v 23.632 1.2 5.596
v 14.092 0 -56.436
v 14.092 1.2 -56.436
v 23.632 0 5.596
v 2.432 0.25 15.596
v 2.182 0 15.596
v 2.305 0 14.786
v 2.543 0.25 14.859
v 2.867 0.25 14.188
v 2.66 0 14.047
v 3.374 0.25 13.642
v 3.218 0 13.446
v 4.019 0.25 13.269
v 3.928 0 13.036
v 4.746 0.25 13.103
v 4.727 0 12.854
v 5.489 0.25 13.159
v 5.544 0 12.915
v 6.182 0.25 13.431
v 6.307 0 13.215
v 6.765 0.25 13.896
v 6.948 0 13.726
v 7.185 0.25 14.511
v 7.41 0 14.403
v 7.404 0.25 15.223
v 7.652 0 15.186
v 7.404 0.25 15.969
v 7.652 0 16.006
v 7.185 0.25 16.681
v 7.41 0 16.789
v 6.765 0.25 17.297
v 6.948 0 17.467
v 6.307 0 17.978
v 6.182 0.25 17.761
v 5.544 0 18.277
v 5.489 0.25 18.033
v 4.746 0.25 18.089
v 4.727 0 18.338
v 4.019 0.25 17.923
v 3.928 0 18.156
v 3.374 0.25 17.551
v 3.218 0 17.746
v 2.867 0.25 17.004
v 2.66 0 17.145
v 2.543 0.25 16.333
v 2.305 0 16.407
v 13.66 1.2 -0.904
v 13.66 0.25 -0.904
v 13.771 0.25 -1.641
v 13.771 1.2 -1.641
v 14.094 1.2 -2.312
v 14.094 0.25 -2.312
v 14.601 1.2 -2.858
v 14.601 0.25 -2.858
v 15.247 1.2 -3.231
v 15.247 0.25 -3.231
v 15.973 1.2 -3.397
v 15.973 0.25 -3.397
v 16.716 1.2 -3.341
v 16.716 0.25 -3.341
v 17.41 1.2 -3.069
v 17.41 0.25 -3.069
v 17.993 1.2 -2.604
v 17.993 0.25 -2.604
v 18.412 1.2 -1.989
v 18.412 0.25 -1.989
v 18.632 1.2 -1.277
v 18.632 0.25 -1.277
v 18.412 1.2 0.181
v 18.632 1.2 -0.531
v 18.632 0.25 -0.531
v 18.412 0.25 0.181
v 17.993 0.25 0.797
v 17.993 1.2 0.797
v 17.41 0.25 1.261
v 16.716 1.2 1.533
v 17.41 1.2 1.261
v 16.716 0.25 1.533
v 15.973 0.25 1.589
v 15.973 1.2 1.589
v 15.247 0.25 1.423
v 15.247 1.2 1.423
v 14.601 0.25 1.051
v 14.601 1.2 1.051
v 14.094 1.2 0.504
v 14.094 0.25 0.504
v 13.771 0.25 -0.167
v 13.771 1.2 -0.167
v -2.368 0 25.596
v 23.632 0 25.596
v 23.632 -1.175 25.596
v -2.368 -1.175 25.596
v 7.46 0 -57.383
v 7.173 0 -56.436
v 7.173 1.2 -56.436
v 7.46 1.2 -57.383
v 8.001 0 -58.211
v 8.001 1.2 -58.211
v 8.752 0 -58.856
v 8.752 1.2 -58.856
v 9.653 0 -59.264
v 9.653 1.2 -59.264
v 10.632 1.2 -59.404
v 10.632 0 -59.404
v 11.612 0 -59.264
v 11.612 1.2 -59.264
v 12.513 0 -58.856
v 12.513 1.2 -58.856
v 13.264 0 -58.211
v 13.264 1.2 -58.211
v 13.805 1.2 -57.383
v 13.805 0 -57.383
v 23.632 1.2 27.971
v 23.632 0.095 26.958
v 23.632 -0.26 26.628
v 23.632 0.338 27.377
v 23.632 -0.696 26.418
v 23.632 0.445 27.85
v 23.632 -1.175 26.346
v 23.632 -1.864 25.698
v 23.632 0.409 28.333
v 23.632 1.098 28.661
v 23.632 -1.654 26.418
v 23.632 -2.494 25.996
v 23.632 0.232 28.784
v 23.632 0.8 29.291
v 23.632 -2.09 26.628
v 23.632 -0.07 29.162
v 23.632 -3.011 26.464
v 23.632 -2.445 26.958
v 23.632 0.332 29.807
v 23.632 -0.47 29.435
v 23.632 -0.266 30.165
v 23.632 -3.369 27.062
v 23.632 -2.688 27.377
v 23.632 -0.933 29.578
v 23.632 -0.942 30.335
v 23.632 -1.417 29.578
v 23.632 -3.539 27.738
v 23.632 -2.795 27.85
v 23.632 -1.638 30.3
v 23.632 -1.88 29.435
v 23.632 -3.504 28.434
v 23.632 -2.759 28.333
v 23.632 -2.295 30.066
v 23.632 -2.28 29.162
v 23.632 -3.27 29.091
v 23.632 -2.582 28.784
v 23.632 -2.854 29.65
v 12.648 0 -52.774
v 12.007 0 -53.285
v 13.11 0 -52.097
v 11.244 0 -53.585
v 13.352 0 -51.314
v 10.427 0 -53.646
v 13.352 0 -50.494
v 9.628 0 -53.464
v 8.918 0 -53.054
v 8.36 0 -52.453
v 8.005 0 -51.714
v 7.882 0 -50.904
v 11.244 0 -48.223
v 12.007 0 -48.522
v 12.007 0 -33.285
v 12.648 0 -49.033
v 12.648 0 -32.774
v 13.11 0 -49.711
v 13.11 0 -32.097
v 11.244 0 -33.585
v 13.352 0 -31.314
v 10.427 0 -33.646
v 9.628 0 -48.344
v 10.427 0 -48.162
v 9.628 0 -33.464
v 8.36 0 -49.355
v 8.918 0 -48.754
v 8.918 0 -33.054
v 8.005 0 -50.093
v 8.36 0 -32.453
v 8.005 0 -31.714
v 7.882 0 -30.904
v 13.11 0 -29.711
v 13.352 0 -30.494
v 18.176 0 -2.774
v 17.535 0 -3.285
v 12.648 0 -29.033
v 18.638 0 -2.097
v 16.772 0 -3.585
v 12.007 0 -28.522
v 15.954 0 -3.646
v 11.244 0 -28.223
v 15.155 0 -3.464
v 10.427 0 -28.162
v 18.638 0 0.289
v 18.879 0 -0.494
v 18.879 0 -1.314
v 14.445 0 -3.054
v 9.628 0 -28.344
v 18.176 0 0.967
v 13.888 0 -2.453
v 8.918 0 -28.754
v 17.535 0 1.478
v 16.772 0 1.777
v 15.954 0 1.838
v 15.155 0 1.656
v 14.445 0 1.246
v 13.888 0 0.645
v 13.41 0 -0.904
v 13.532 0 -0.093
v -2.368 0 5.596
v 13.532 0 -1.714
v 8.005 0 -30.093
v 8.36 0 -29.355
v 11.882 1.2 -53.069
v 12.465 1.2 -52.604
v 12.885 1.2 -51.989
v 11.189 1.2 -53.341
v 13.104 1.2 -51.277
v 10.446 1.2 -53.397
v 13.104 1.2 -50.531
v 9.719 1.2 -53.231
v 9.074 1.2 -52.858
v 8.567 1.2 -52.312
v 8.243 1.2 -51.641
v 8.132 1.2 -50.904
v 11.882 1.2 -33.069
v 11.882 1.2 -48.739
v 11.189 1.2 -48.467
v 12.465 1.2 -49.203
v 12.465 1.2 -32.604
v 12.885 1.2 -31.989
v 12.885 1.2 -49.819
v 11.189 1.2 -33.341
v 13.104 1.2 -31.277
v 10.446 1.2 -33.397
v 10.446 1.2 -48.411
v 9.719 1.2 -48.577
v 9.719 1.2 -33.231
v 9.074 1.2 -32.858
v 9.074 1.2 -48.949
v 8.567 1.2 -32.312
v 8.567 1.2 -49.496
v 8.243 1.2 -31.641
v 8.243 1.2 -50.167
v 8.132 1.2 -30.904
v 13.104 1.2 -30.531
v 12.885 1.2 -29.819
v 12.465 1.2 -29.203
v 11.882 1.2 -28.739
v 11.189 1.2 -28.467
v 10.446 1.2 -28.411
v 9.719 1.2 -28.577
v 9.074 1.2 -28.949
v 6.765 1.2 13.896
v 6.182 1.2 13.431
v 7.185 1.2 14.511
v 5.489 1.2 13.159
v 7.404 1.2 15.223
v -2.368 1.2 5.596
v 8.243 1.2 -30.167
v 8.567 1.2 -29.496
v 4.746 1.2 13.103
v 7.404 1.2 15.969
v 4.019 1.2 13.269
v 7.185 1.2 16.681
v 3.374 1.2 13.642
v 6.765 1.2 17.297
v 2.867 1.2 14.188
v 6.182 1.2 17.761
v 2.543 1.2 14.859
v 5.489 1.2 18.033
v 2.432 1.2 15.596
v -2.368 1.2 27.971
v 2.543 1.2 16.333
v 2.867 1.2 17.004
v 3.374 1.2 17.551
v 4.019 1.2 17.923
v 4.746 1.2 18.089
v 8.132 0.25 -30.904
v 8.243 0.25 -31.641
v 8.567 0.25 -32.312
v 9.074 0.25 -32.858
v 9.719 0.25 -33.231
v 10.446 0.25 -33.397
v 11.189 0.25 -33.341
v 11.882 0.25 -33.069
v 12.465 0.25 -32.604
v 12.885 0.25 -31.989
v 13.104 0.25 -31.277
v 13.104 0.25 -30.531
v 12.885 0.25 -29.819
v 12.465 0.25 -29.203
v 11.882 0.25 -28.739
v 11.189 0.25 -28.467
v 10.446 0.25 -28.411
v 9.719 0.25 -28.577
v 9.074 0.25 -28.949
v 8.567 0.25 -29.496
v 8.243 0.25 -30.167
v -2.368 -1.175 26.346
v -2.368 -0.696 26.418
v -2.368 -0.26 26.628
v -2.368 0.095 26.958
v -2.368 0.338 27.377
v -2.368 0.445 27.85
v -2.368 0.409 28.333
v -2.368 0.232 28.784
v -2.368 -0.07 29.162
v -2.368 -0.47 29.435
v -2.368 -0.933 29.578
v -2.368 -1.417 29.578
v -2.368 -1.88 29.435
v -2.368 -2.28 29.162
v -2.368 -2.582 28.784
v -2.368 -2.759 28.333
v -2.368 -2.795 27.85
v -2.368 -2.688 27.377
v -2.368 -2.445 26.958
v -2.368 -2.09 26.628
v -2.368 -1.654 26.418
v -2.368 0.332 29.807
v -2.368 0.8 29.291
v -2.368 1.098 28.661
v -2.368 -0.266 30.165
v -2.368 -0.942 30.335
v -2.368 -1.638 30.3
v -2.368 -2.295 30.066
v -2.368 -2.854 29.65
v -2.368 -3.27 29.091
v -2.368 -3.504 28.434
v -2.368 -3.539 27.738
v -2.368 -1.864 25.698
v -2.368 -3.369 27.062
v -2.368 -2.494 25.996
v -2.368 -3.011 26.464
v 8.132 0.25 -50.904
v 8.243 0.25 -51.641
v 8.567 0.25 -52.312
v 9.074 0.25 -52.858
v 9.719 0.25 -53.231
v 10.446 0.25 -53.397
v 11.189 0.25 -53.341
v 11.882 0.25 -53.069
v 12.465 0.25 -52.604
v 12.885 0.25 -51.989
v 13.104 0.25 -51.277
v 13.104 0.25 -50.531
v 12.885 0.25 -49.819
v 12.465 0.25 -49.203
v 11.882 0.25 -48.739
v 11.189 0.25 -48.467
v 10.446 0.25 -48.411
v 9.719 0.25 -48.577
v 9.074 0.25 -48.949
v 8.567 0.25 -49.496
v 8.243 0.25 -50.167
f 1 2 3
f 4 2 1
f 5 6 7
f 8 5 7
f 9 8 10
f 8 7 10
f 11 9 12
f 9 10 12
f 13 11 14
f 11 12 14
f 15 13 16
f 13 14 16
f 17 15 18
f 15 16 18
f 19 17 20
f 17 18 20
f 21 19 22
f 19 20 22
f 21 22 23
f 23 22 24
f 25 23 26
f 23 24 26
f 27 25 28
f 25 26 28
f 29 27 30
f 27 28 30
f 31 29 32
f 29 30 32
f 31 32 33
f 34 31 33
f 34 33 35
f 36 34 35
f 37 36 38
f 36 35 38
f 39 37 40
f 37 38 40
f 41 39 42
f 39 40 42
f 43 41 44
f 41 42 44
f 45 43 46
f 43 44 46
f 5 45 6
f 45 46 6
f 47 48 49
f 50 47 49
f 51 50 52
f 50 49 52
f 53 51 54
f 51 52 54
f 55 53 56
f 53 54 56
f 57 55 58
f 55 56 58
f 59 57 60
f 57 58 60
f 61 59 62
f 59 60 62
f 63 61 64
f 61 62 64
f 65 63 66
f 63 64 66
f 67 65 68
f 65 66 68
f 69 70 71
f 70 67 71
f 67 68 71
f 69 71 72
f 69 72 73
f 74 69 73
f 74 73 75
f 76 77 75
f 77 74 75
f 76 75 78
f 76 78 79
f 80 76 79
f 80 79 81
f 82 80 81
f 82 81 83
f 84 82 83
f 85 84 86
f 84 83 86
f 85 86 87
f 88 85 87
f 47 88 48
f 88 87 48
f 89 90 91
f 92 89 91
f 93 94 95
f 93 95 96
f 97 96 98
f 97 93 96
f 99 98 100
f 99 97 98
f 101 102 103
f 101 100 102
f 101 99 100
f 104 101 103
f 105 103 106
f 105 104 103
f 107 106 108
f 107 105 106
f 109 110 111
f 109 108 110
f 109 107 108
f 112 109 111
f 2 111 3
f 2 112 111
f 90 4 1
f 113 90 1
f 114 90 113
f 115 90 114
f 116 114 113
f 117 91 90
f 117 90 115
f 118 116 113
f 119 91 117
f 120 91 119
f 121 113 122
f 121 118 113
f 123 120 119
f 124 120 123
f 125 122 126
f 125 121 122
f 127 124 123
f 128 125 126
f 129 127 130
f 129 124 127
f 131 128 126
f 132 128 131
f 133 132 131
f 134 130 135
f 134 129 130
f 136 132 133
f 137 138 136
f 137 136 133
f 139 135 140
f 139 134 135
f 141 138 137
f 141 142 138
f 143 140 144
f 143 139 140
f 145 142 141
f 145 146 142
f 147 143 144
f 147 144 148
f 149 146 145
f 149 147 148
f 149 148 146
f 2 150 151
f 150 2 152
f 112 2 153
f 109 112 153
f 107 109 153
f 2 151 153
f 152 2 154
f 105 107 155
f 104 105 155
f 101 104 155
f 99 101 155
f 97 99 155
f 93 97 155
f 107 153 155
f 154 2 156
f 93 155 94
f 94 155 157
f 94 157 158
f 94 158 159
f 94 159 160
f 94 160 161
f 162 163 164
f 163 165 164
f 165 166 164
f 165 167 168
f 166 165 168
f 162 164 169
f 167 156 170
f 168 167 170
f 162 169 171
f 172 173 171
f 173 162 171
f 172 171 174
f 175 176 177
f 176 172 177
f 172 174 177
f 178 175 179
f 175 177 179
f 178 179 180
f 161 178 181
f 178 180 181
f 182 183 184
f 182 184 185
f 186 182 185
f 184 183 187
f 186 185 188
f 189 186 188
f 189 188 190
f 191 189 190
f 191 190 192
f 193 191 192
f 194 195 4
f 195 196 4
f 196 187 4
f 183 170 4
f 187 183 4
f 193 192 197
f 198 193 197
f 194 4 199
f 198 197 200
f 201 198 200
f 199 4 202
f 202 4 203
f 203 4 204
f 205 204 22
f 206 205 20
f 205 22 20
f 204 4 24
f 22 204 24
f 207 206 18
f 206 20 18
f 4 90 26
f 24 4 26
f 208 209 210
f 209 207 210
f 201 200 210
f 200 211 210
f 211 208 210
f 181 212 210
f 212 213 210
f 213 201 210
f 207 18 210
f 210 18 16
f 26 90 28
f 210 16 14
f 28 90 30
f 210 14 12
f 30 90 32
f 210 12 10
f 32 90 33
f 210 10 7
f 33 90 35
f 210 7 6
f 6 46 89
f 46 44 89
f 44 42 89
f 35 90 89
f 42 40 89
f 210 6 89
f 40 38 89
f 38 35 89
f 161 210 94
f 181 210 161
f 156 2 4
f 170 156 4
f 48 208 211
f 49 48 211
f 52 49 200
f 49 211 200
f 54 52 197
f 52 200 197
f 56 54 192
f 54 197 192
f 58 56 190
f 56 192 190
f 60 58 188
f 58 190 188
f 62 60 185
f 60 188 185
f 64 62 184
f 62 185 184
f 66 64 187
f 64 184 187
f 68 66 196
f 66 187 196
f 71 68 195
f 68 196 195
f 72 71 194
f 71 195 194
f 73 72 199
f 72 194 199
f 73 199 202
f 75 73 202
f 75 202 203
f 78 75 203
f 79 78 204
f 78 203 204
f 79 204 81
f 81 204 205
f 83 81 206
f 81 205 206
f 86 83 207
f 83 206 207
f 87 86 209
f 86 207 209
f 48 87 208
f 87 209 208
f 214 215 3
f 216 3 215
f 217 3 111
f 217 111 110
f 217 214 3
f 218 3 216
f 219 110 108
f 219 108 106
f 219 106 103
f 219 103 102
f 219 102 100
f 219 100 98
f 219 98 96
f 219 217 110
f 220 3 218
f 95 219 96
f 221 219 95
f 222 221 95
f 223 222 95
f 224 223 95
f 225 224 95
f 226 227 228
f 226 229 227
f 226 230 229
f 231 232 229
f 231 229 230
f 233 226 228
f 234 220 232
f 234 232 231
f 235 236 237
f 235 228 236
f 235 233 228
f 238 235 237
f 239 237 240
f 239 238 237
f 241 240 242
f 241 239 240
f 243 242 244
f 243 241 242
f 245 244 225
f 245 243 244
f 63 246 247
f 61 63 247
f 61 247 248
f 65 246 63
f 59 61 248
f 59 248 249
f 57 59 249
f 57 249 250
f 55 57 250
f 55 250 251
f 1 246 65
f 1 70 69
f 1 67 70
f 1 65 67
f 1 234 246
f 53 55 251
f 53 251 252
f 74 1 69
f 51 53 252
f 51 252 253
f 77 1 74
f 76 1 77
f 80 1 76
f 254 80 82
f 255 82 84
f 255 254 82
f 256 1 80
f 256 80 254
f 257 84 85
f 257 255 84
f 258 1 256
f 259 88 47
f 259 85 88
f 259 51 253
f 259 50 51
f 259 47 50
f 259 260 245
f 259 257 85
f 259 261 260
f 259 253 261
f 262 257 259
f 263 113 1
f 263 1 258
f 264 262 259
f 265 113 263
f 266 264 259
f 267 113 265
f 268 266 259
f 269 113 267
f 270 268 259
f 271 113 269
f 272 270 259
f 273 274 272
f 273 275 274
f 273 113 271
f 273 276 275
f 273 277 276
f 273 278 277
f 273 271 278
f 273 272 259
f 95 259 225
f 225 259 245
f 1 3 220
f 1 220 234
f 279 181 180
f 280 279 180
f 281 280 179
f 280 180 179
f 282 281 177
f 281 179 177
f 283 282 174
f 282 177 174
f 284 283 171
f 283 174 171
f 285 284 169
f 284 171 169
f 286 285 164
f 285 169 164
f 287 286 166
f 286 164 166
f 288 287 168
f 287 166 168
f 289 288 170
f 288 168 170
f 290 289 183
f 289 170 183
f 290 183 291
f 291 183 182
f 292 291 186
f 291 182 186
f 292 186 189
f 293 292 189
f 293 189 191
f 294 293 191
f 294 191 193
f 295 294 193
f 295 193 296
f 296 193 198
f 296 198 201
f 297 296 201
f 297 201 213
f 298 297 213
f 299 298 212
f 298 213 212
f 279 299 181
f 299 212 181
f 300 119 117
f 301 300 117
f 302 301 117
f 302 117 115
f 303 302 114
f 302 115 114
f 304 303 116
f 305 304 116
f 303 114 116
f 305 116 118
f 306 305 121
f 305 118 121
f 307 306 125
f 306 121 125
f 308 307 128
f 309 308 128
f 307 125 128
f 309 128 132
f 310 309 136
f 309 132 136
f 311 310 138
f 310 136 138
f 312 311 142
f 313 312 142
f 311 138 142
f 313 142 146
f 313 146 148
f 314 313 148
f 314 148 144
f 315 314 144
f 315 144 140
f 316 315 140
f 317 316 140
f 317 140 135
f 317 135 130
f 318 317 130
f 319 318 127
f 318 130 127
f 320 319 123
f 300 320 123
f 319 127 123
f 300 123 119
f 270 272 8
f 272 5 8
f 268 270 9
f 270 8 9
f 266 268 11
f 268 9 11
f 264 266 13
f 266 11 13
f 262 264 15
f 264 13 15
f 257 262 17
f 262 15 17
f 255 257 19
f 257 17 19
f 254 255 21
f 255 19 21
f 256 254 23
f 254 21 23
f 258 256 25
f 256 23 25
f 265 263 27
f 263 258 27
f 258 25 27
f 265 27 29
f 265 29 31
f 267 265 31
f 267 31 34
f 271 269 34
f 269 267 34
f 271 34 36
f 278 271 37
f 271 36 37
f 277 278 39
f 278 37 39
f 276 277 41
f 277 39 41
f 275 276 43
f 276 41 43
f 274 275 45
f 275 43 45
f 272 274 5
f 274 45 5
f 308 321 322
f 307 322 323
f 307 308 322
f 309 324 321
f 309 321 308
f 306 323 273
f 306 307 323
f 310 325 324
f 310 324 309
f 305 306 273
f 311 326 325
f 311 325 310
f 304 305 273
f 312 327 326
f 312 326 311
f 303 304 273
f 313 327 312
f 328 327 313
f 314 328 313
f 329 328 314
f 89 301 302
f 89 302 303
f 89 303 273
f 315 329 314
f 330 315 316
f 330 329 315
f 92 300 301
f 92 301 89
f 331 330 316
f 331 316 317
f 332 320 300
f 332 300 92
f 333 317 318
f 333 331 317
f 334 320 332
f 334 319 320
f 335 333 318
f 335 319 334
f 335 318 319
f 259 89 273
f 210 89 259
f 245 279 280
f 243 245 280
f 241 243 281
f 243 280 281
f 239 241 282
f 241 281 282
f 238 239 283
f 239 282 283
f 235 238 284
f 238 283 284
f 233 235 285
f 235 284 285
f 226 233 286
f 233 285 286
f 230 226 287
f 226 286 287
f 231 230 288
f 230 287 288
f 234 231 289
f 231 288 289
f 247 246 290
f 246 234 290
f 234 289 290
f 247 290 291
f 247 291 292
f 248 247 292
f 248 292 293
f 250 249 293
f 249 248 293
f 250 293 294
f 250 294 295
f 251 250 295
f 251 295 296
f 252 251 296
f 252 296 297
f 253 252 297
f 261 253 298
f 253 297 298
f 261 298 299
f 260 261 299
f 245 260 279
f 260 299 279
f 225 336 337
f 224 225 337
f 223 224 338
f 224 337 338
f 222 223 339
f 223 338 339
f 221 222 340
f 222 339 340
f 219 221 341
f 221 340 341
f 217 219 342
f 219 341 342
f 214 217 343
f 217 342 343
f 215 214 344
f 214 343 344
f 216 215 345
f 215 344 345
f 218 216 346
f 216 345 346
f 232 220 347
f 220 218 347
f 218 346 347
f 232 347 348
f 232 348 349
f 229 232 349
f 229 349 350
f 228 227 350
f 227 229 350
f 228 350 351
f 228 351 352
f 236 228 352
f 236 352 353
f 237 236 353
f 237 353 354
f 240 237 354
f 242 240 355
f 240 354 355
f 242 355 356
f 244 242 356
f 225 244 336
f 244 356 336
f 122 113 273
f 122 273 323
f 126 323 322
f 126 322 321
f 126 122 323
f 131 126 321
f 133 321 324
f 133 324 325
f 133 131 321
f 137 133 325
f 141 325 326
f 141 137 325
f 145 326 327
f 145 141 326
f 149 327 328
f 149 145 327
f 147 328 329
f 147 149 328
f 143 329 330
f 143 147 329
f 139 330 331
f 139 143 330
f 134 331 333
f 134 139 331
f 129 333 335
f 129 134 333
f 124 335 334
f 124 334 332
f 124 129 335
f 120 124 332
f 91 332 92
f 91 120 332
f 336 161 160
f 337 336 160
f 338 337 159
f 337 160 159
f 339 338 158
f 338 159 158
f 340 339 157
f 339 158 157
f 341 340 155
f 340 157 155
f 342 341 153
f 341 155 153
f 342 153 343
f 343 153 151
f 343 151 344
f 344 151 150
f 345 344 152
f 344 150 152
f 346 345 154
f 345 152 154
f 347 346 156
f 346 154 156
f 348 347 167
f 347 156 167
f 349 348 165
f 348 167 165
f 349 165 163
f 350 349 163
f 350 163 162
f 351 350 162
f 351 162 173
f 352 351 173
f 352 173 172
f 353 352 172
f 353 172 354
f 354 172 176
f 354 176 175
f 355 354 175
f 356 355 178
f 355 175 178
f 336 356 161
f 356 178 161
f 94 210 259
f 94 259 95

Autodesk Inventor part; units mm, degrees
ref_plane "YZ Plane" through (0, 0, 0) normal (1, 0, 0) x (0, 1, 0)
ref_plane "XZ Plane" through (0, 0, 0) normal (0, 1, 0) x (-1, 0, 0)
ref_plane "XY Plane" through (0, 0, 0) normal (0, 0, 1) x (1, 0, 0)
sketch "Boceto1" plane through (0, 0, 0) normal (0, 1, 0) x (-1, 0, 0)
  line L0 (2.3676, 25.5961) -> (2.3676, 5.5961)
  line L1 (-23.6324, 5.5961) -> (-23.6324, 25.5961)
  line L2 (-23.6324, 25.5961) -> (2.3676, 25.5961)
  line L3 (2.3676, 25.5961) -> (2.3676, 5.5961)
  circle A0 centre (-16.1599, -0.9039) radius 2.5
  circle A1 centre (-4.9324, 15.5961) radius 2.5
  circle A2 centre (-10.6324, -50.9039) radius 2.5
  line L4 (2.3676, 5.5961) -> (-7.173, -56.436)
  line L5 (-14.0917, -56.436) -> (-23.6324, 5.5961)
  arc A3 (-14.0917, -56.436) -> (-7.173, -56.436) centre (-10.6324, -55.9039) ccw
  circle A4 centre (-10.6324, -30.9039) radius 2.5
  point P0 (0, 0)
  dimension "d2" = 20
  dimension "d16" = 26
  dimension "d17" = 5
  dimension "d18" = 5
  dimension "d19" = 5
  dimension "d20" = 10
  dimension "d21" = 7.3
  dimension "d22" = 26.5
  dimension "d26" = 5
  dimension "d30" = 5
  dimension "d31" = 20
extrude "Extrusión1" add sketch "Boceto1" along normal blind 1.2
sketch "Boceto4" plane through (23.6324, 0, 25.5961) normal (1, 0, 0) x (0, 0, -1)
  circle A0 centre (-2.375, -1.175) radius 2.375
  circle A1 centre (-2.375, -1.175) radius 1.625
  line L0 (0, 0) -> (0, 1.2) projected
  line L1 (0, 1.2) -> (20, 1.2) projected
  line L2 (20, 1.2) -> (0, 1.2) projected
  line L3 (0, 1.2) -> (-2.375, 1.2)
  line L4 (20, 0) -> (0, 0) projected
  line L5 (0, 0) -> (0, -1.175)
  point P0 (25.5961, 0)
  point P1 (20, 2)
  dimension "d12" = 4.75
  dimension "d13" = 3.25
extrude "Extrusión3" add sketch "Boceto4" against normal blind 26
chamfer "Chaflán1" distance 0.25 angle 45 4 edges at (7.4324, 0, 15.5961) (18.6599, 0, -0.9039) (13.1324, 0, -50.9039) (13.1324, 0, -30.9039)
properties part number "Ala 2 Bisagra tipo T"
